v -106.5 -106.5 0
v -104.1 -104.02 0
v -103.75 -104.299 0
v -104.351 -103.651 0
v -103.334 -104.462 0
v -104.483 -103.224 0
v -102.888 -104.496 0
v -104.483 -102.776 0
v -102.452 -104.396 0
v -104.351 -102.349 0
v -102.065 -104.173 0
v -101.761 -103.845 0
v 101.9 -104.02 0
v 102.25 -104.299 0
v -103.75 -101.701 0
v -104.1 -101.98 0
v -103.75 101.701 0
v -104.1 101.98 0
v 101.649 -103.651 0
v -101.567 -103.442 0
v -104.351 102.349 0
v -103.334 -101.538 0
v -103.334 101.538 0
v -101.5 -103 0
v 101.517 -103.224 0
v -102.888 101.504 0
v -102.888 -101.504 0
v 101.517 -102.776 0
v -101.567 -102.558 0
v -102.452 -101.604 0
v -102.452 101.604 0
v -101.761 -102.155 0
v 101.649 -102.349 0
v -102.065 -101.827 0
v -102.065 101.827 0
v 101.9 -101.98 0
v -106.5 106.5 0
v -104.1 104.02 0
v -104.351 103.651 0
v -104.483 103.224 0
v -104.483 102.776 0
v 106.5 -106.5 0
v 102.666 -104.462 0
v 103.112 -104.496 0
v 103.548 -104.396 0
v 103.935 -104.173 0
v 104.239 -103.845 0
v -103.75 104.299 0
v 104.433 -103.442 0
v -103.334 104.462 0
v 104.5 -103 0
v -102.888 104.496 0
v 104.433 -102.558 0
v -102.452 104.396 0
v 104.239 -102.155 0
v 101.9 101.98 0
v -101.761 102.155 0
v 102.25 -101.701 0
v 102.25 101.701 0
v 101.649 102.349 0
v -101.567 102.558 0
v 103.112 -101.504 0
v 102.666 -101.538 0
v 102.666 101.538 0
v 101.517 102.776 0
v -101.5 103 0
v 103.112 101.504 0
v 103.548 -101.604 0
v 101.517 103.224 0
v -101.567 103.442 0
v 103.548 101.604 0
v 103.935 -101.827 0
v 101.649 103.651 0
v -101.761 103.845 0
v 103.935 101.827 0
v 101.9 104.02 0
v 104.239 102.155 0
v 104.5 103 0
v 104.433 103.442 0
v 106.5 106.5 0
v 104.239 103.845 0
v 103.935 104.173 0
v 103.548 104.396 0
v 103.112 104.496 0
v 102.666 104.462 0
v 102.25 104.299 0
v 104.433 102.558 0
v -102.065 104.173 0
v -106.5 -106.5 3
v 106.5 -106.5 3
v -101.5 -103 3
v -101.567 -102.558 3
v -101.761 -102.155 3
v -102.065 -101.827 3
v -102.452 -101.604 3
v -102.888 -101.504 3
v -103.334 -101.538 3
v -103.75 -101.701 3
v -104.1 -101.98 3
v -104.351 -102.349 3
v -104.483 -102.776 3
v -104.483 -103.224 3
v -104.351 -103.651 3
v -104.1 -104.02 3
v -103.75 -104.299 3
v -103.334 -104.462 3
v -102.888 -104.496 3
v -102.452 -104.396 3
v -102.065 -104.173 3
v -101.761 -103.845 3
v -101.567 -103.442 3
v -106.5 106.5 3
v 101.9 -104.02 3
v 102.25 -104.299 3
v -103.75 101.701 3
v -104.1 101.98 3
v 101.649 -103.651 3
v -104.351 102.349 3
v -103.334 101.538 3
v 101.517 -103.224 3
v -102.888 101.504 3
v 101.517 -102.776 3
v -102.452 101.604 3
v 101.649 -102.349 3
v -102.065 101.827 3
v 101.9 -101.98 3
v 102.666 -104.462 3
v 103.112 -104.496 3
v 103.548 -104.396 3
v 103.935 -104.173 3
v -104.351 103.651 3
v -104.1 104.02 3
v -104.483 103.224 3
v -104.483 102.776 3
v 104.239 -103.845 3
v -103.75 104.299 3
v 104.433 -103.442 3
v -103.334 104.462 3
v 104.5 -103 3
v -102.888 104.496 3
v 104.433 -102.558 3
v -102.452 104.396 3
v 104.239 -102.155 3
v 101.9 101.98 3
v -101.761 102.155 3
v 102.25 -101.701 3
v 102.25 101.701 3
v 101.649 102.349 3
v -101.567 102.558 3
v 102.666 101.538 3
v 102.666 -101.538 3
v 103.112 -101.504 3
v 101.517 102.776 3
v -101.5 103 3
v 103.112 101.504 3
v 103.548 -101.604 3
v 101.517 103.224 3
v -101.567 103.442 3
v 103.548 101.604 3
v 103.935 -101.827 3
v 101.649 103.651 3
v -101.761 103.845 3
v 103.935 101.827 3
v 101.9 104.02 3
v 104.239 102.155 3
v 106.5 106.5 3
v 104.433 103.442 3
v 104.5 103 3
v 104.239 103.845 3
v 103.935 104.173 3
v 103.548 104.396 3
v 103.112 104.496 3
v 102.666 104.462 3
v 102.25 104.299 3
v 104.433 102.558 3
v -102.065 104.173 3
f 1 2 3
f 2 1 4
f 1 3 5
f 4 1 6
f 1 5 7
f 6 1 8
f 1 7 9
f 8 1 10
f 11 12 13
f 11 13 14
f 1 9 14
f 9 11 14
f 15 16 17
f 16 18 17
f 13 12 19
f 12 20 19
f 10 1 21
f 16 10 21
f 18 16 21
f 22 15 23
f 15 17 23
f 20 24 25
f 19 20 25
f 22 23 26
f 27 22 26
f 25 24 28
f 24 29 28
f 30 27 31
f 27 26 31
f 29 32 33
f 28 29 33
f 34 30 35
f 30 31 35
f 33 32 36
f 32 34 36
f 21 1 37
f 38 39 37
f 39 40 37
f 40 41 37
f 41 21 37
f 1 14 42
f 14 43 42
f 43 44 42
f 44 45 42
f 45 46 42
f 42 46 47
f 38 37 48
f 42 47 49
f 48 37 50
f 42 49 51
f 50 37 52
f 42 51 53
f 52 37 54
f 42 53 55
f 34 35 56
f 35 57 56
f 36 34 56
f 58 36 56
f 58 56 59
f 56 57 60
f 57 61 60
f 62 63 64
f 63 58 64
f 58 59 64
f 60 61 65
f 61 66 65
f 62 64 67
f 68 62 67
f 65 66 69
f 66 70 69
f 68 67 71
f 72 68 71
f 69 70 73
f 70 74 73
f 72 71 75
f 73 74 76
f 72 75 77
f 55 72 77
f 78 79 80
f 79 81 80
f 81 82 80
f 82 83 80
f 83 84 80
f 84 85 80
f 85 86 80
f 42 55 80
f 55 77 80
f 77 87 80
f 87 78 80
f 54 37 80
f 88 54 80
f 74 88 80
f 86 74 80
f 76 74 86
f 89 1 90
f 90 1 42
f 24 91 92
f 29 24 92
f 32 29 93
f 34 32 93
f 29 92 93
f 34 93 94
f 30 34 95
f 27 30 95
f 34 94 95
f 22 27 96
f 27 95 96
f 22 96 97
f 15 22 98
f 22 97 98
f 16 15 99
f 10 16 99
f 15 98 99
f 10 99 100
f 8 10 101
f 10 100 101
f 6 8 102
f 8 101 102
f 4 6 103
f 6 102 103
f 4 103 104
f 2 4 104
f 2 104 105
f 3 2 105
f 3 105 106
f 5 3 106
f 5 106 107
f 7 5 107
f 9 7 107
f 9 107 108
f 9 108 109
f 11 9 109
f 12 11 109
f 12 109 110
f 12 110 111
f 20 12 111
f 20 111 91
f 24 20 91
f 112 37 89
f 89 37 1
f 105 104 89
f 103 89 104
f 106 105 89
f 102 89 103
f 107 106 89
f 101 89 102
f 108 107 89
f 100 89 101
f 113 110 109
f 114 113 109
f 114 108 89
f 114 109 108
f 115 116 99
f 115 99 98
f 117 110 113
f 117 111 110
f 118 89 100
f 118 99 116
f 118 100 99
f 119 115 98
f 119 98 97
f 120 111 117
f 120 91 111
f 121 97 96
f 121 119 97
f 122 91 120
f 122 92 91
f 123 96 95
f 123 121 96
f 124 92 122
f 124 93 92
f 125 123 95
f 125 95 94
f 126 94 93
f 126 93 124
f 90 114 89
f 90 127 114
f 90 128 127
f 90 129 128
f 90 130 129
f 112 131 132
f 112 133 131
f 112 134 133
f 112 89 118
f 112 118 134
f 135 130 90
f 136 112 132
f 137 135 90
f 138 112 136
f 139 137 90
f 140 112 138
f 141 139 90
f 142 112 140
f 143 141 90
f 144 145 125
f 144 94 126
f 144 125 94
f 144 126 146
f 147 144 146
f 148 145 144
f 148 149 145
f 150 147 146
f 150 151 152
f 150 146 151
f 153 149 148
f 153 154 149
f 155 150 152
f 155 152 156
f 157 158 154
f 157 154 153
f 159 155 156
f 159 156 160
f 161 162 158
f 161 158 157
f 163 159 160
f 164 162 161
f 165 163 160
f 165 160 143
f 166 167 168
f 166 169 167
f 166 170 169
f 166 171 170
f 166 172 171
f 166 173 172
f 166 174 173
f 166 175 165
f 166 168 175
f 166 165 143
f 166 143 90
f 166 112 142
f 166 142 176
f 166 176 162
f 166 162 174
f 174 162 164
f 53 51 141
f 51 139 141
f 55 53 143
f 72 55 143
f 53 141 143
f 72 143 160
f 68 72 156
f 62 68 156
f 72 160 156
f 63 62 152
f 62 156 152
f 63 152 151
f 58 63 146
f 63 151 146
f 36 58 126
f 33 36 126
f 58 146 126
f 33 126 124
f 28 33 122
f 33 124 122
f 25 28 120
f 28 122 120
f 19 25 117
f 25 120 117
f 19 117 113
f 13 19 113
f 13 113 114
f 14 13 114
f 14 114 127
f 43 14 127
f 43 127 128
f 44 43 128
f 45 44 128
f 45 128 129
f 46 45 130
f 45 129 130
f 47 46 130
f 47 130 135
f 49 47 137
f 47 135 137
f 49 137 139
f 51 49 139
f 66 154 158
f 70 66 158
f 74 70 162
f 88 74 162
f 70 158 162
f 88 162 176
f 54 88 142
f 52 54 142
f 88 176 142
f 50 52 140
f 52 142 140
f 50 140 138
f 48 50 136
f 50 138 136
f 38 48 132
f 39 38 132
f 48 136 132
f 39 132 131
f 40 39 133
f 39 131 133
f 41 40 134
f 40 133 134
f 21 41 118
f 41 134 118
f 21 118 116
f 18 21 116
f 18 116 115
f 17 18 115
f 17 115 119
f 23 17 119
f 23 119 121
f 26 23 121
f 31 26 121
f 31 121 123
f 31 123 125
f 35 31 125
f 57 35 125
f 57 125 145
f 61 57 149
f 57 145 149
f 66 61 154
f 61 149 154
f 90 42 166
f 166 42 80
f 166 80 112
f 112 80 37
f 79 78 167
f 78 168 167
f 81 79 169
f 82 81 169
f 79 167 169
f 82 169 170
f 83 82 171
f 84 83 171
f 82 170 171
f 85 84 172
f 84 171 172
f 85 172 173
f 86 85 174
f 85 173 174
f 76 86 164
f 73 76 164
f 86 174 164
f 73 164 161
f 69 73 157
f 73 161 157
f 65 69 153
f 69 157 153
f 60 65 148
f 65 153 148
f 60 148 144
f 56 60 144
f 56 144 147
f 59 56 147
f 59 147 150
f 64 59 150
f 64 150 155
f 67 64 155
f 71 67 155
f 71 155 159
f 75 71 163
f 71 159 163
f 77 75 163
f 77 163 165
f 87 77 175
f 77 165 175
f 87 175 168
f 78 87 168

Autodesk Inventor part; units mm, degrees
ref_plane "YZ Plane" through (0, 0, 0) normal (1, 0, 0) x (0, 1, 0)
ref_plane "XZ Plane" through (0, 0, 0) normal (0, 1, 0) x (-1, 0, 0)
ref_plane "XY Plane" through (0, 0, 0) normal (0, 0, 1) x (1, 0, 0)
sketch "Sketch1" plane through (0, 0, 0) normal (0, 0, 1) x (1, 0, 0)
  line L0 (-106.5, -106.5) -> (106.5, -106.5)
  line L1 (106.5, -106.5) -> (106.5, 106.5)
  line L2 (106.5, 106.5) -> (-106.5, 106.5)
  line L3 (-106.5, 106.5) -> (-106.5, -106.5)
  line L4 (-106.5, -106.5) -> (106.5, 106.5) construction
  line L5 (106.5, -106.5) -> (-106.5, 106.5) construction
  point P0 (0, 0)
  dimension "d0" = 213
extrude "Extrusion1" add sketch "Sketch1" along normal blind 3
sketch "Sketch2" plane through (0, 0, 3) normal (0, 0, 1) x (1, 0, 0)
  line L0 (-106.5, -106.5) -> (106.5, -106.5) projected
  line L1 (106.5, -106.5) -> (106.5, 106.5) projected
  line L2 (106.5, 106.5) -> (-106.5, 106.5) projected
  line L3 (-106.5, 106.5) -> (-106.5, -106.5) projected
  circle A0 centre (-103, 103) radius 1.5
  line L4 (106.5, 106.5) -> (-106.5, 106.5) construction
  line L5 (0, 106.5) -> (0, -106.5) construction
  line L6 (-106.5, -106.5) -> (106.5, -106.5) construction
  line L7 (-106.5, 0) -> (106.5, 0) construction
  circle A1 centre (103, 103) radius 1.5
  circle A2 centre (-103, -103) radius 1.5
  circle A3 centre (103, -103) radius 1.5
  point P0 (0, 0)
  dimension "d3" = 3
  dimension "d4" = 2
  dimension "d5" = 2
extrude "Extrusion2" cut sketch "Sketch2" against normal through all contours A0 | A1 | A2 | A3
properties part number "Heated Build Plate"
